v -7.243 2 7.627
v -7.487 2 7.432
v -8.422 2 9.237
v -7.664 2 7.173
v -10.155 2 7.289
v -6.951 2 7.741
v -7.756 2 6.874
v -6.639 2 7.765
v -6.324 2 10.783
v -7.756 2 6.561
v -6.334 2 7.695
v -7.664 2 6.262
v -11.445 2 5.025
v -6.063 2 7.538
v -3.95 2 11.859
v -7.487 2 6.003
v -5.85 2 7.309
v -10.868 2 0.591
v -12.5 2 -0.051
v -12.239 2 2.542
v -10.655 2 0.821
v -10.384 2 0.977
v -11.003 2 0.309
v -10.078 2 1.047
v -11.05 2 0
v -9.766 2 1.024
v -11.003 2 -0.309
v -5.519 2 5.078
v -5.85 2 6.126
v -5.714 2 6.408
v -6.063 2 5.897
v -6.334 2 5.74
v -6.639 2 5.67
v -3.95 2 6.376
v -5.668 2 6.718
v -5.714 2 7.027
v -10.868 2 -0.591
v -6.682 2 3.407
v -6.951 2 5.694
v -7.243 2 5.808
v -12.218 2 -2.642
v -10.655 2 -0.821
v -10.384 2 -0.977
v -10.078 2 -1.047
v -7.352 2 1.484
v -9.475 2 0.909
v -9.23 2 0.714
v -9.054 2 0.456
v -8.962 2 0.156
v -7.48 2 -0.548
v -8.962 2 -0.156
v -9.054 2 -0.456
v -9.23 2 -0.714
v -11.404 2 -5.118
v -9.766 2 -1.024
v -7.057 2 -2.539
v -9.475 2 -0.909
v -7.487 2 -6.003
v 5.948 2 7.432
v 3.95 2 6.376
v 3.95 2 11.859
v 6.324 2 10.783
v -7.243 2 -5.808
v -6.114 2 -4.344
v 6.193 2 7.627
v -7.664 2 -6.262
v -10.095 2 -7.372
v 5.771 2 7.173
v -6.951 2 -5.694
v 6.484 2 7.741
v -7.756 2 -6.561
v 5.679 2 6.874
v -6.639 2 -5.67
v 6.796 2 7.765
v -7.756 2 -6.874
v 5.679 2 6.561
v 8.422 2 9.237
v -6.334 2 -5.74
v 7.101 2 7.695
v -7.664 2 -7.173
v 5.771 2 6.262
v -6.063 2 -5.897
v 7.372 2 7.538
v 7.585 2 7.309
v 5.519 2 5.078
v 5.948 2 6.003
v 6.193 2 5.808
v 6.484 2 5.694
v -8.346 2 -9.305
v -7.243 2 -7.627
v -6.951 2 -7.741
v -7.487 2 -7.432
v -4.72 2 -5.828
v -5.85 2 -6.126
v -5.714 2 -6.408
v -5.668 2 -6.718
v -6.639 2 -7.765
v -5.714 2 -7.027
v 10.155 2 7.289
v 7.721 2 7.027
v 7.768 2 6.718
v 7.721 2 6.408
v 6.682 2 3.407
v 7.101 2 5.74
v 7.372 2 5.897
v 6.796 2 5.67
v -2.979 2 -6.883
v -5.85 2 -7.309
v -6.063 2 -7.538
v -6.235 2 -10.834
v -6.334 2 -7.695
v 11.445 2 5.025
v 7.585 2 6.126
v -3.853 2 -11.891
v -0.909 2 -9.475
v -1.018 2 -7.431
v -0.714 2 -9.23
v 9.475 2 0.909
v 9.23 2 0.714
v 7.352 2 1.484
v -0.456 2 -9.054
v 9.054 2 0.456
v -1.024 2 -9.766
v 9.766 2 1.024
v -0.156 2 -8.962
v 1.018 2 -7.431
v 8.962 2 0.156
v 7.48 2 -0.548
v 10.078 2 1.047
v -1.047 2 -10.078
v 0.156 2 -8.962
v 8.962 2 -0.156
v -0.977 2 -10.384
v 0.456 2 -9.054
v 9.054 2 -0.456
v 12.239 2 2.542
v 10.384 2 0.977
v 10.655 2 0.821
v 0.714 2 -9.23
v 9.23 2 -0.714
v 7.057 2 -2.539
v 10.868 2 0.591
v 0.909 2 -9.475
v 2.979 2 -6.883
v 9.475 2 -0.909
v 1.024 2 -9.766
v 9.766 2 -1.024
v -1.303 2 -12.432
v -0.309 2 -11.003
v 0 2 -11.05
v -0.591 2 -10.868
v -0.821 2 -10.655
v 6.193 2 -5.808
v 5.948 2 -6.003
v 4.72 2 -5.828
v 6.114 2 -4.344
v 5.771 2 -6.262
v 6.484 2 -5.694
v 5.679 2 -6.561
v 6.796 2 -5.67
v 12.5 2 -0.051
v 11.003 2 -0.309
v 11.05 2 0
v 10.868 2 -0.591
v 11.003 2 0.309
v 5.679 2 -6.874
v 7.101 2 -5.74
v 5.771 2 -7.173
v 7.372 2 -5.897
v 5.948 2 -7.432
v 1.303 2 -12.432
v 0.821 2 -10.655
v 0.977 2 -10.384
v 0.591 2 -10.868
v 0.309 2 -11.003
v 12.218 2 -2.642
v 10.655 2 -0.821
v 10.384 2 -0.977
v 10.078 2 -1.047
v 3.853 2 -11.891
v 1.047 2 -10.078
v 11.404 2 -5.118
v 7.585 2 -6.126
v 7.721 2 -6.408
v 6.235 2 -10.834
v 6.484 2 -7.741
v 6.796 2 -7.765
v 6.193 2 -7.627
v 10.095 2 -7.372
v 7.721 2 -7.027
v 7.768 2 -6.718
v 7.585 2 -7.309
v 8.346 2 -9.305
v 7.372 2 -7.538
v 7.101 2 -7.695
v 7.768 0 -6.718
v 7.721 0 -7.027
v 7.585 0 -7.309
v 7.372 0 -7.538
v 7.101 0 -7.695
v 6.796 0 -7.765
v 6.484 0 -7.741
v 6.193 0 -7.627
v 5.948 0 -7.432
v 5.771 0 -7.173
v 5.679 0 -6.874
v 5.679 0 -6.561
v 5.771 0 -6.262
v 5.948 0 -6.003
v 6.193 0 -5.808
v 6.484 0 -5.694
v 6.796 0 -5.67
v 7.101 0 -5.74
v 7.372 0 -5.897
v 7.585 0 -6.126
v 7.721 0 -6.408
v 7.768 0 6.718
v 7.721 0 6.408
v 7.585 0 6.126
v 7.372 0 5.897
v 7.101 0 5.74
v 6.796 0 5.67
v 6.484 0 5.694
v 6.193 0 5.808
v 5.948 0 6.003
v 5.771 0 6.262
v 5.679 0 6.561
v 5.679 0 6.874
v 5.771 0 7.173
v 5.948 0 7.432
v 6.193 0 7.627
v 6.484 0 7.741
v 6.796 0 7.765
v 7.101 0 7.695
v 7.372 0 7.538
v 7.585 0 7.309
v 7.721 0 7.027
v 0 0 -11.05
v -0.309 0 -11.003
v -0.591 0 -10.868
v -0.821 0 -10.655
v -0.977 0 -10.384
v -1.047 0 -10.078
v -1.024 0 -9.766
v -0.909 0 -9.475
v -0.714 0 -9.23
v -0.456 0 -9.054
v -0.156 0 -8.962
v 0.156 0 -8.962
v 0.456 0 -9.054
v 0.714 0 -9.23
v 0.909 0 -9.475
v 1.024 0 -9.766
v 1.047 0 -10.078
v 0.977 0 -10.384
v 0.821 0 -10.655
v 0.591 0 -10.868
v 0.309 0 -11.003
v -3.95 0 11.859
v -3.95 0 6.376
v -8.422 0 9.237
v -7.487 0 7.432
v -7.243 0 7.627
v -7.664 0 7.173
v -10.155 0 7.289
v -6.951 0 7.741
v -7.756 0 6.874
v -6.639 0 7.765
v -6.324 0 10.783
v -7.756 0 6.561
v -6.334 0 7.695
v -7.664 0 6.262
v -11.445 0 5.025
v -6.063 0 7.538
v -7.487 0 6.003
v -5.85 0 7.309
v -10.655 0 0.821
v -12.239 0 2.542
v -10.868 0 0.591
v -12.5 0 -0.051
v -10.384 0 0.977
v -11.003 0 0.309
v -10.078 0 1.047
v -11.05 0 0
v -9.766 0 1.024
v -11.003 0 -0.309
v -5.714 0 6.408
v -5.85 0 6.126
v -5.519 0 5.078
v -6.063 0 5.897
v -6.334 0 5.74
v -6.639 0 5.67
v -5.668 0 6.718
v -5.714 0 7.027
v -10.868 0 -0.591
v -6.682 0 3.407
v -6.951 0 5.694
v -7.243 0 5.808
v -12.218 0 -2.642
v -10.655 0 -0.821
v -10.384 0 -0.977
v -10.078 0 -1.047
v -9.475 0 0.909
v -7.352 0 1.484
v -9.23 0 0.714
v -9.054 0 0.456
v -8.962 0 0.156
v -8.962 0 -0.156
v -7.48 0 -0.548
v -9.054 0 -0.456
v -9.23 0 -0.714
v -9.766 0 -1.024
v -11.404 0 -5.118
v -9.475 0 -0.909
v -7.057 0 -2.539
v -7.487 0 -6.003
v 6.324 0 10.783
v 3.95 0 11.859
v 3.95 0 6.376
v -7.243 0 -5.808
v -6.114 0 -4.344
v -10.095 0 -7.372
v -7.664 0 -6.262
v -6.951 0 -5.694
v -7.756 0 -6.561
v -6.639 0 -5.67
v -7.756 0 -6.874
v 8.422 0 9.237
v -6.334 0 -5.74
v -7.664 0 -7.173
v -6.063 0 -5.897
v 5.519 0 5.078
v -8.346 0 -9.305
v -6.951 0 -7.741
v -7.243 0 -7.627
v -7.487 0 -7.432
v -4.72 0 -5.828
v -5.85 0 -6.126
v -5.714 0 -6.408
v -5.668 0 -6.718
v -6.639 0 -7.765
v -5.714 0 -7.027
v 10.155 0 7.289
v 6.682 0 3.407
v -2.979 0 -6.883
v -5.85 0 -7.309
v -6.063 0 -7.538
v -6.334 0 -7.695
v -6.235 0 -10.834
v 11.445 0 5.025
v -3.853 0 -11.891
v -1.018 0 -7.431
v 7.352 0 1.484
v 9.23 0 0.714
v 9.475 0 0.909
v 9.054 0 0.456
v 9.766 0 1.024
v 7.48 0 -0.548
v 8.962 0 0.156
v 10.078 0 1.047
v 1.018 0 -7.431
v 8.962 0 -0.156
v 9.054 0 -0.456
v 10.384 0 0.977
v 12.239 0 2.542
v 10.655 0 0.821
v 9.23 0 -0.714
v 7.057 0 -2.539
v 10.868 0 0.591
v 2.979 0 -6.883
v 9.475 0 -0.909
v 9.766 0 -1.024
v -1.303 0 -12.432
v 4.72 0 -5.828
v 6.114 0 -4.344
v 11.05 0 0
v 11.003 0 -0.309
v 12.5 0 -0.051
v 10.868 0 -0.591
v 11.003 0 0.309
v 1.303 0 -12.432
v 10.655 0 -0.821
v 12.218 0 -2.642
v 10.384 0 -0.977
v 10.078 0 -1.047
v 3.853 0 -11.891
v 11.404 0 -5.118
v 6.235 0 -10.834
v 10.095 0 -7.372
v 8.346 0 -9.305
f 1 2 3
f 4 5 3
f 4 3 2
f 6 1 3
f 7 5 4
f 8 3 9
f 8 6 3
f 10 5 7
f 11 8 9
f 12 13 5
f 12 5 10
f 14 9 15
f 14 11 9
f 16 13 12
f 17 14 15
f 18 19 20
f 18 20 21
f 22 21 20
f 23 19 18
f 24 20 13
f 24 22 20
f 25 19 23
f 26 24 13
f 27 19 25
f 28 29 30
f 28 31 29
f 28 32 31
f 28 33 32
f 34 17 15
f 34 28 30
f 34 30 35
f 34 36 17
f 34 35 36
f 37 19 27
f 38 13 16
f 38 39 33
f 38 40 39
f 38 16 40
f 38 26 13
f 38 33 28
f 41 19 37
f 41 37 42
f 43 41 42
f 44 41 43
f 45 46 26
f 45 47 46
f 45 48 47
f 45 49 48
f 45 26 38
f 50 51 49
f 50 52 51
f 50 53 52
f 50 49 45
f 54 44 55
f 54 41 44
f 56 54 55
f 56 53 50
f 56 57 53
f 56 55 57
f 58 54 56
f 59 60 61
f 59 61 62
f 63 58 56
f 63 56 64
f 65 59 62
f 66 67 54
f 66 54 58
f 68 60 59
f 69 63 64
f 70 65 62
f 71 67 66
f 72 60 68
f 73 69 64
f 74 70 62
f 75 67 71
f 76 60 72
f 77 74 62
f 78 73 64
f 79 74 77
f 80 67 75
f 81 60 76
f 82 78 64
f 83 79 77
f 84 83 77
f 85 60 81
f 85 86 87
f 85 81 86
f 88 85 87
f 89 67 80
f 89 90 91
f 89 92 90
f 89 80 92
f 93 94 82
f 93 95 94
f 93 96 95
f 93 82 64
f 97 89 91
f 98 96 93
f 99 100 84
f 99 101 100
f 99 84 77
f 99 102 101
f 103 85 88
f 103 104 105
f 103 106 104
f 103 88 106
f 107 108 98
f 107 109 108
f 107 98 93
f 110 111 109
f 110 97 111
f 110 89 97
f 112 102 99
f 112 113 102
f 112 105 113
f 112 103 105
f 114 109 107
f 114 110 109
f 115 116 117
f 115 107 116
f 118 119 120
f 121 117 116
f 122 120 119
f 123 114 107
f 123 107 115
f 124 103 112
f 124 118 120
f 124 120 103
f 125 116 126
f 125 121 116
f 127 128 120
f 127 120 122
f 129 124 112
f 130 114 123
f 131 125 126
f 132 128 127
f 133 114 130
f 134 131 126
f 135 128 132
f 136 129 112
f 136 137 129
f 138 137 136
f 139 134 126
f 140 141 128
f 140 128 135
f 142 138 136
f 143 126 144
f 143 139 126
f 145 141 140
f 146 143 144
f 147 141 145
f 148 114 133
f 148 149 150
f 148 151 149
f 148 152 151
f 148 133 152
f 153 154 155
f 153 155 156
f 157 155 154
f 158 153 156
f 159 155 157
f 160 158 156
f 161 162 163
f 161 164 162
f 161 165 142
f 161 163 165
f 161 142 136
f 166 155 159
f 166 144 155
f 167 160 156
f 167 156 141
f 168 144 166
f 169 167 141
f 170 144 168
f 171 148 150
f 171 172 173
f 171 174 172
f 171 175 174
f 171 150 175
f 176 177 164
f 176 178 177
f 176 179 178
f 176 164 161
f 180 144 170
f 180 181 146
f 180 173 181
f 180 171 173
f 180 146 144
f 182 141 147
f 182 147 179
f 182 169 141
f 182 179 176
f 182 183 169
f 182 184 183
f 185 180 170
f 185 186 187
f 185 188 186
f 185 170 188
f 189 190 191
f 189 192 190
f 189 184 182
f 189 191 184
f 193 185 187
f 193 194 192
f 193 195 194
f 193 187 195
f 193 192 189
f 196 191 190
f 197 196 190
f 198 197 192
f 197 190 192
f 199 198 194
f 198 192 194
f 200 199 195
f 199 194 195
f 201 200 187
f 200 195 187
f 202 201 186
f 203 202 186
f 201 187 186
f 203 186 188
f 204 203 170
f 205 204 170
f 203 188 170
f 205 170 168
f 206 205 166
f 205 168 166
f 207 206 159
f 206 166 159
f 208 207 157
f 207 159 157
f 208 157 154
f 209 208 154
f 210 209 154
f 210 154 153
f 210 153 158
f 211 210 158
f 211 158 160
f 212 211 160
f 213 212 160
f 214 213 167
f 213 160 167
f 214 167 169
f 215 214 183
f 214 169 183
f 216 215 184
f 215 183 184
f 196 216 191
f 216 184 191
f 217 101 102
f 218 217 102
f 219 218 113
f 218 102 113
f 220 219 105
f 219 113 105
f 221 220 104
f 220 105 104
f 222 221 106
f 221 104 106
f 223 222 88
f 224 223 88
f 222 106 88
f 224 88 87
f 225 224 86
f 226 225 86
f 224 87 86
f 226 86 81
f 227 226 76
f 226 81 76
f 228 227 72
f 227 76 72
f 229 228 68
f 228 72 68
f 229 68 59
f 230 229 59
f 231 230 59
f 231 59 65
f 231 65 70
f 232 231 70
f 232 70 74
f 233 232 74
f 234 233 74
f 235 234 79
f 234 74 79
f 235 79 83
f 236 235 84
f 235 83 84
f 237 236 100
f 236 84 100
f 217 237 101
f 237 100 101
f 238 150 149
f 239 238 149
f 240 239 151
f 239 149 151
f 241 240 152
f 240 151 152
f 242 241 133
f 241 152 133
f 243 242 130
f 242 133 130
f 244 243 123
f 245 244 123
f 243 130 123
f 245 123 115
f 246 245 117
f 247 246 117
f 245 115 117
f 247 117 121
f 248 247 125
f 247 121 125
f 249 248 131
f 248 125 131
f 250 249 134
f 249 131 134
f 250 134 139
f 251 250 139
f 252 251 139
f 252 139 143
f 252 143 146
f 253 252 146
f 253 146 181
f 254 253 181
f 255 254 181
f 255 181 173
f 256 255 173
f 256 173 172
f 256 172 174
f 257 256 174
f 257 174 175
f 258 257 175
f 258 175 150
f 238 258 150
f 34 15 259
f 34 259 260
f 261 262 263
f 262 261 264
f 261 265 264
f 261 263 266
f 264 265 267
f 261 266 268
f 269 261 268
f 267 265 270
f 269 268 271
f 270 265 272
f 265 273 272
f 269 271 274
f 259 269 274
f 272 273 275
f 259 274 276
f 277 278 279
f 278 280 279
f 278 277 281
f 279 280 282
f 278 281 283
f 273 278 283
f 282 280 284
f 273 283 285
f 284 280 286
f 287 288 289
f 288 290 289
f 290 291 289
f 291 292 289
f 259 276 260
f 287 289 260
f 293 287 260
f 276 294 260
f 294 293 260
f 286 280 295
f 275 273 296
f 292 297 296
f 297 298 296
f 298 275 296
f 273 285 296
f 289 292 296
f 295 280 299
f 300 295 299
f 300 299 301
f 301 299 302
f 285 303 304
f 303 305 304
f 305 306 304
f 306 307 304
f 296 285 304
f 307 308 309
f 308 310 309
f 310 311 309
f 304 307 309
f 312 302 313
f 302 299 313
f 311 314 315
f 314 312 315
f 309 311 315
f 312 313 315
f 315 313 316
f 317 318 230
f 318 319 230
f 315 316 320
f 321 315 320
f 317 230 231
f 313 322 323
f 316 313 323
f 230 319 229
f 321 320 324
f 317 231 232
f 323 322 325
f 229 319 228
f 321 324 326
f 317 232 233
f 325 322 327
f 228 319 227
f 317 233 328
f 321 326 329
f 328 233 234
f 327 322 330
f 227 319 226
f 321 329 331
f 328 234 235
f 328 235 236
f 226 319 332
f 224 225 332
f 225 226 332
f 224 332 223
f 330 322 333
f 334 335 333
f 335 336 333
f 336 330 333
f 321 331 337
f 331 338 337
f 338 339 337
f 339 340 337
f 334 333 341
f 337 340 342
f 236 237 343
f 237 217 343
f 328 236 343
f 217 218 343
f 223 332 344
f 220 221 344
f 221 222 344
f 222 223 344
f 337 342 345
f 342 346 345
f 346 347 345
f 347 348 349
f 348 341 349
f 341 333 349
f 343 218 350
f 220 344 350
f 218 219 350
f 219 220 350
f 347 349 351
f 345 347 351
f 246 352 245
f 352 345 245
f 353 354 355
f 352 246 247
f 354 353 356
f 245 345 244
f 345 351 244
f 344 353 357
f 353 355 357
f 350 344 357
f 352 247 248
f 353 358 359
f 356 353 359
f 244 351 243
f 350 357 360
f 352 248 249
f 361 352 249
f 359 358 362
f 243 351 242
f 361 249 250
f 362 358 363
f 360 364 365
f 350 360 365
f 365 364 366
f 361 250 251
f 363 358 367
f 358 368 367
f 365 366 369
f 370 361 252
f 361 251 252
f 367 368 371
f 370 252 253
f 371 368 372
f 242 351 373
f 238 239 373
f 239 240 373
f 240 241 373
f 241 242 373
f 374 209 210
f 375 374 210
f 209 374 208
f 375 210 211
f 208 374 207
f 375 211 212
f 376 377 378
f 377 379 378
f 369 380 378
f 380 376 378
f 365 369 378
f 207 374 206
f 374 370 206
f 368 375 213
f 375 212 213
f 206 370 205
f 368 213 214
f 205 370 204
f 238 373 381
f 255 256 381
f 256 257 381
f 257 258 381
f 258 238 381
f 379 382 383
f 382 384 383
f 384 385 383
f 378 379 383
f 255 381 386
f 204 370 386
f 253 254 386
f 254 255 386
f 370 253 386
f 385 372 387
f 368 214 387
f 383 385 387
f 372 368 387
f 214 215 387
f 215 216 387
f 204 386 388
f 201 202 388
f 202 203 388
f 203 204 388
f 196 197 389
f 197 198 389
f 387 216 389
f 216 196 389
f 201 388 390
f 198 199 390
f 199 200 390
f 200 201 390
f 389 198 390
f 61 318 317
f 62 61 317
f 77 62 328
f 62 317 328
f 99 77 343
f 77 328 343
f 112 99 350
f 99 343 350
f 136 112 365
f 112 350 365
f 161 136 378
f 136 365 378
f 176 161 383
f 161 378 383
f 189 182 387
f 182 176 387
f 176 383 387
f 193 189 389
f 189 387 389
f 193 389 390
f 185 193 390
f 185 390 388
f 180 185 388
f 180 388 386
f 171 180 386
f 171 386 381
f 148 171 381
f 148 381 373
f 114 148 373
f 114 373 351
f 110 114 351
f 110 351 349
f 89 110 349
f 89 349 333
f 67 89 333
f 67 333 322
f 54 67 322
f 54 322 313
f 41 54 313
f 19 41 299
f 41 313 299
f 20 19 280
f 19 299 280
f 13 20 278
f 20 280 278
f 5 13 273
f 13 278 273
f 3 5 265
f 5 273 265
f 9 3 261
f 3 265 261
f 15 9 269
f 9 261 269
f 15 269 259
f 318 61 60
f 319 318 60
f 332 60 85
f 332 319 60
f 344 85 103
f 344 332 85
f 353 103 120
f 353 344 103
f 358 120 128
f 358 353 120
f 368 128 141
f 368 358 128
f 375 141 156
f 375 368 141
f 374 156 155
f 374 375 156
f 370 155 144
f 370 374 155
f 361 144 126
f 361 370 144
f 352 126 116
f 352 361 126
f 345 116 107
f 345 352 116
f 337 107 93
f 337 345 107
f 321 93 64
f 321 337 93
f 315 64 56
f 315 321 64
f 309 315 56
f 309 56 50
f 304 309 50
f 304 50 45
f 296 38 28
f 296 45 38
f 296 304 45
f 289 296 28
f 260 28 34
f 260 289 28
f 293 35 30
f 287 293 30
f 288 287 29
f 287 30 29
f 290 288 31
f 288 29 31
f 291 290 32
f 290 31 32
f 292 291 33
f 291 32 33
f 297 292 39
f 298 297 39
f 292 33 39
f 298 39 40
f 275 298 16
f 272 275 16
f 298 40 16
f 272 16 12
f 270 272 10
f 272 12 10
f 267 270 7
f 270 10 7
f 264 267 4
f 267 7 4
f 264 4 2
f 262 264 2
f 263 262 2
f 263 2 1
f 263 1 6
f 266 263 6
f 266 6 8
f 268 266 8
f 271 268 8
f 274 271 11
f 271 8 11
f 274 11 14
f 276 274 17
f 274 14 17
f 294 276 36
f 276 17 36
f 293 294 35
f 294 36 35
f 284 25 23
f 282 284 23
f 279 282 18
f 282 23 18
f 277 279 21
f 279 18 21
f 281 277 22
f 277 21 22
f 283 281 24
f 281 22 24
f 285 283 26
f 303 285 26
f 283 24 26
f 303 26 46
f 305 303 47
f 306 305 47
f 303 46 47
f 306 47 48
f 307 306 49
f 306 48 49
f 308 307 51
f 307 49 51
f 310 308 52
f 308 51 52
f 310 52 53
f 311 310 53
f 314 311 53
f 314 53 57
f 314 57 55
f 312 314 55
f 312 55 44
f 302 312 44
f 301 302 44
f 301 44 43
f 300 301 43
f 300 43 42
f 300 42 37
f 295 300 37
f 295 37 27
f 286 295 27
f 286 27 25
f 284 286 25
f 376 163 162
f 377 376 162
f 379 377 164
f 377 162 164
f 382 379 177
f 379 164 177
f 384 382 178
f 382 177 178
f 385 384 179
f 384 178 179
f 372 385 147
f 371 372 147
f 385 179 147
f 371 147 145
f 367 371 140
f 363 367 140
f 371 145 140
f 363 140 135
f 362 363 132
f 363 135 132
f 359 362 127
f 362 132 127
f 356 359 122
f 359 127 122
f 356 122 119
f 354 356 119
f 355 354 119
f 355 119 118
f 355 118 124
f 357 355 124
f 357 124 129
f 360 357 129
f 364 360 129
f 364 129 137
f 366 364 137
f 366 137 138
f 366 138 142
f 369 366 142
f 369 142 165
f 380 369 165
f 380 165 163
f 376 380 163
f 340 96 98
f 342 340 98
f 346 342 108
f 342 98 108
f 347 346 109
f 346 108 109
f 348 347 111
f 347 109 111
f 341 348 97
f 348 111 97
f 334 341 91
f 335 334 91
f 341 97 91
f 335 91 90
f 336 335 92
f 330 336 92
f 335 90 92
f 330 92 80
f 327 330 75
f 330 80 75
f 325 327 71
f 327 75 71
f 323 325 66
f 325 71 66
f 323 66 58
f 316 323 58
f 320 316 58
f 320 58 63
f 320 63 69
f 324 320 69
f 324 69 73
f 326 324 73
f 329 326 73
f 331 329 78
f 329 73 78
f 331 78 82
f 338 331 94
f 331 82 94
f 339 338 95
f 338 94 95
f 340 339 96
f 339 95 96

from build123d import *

# Parameters (mm, degrees)
SKETCH1_R           = 12.5
SKETCH1_R_2         = 7.5
BOSS_EXTRUDE1_DEPTH = 2
SKETCH2_R           = 1.05
CUT_EXTRUDE1_DEPTH  = 5
CIRPATTERN1_COUNT   = 3
CIRPATTERN1_ANGLE   = 180
SKETCH3_R           = 1.05
CUT_EXTRUDE2_DEPTH  = 2
SKETCH4_W           = 7.9
SKETCH4_H           = 11.346310676
CUT_EXTRUDE3_DEPTH  = 10


with BuildPart() as part:
    # Sketch1 → Boss-Extrude1 (new body)
    with BuildSketch(Plane(origin=(0, 0, 0), x_dir=(1, 0, 0), z_dir=(0, 1, 0))):
        Circle(SKETCH1_R)
        Circle(SKETCH1_R_2, mode=Mode.SUBTRACT)
    extrude(amount=BOSS_EXTRUDE1_DEPTH)

    # Sketch2 → Cut-Extrude1 (cut)
    with BuildSketch(Plane(origin=(0, 2, 0), x_dir=(1, 0, 0), z_dir=(0, 1, 0))):
        with Locations((10, 0)):
            Circle(SKETCH2_R)
    cut_extrude1 = extrude(amount=-CUT_EXTRUDE1_DEPTH, mode=Mode.SUBTRACT)

    # CirPattern1: Cut-Extrude1 ×3 about axis
    cirpattern1_axis = Axis((0, 0, 0), (0, 1, 0))
    for i in range(1, CIRPATTERN1_COUNT):
        add(cut_extrude1.rotate(cirpattern1_axis, i * CIRPATTERN1_ANGLE / (CIRPATTERN1_COUNT - 1)), mode=Mode.SUBTRACT)

    # Sketch3 → Cut-Extrude2 (cut)
    with BuildSketch(Plane(origin=(0, 2, 0), x_dir=(1, 0, 0), z_dir=(0, 1, 0))):
        with Locations((-6.71751442, 6.71751442)):
            Circle(SKETCH3_R)
        with Locations((6.71751442, 6.71751442)):
            Circle(SKETCH3_R)
        with Locations((6.71751442, -6.71751442)):
            Circle(SKETCH3_R)
        with Locations((-6.71751442, -6.71751442)):
            Circle(SKETCH3_R)
    extrude(amount=-CUT_EXTRUDE2_DEPTH, mode=Mode.SUBTRACT)

    # Sketch4 → Cut-Extrude3 (cut)
    with BuildSketch(Plane(origin=(0, 2, 0), x_dir=(1, 0, 0), z_dir=(0, 1, 0))):
        with Locations((0, -10.263253748)):
            Rectangle(SKETCH4_W, SKETCH4_H)
    extrude(amount=-CUT_EXTRUDE3_DEPTH, mode=Mode.SUBTRACT)


solid = part.part
